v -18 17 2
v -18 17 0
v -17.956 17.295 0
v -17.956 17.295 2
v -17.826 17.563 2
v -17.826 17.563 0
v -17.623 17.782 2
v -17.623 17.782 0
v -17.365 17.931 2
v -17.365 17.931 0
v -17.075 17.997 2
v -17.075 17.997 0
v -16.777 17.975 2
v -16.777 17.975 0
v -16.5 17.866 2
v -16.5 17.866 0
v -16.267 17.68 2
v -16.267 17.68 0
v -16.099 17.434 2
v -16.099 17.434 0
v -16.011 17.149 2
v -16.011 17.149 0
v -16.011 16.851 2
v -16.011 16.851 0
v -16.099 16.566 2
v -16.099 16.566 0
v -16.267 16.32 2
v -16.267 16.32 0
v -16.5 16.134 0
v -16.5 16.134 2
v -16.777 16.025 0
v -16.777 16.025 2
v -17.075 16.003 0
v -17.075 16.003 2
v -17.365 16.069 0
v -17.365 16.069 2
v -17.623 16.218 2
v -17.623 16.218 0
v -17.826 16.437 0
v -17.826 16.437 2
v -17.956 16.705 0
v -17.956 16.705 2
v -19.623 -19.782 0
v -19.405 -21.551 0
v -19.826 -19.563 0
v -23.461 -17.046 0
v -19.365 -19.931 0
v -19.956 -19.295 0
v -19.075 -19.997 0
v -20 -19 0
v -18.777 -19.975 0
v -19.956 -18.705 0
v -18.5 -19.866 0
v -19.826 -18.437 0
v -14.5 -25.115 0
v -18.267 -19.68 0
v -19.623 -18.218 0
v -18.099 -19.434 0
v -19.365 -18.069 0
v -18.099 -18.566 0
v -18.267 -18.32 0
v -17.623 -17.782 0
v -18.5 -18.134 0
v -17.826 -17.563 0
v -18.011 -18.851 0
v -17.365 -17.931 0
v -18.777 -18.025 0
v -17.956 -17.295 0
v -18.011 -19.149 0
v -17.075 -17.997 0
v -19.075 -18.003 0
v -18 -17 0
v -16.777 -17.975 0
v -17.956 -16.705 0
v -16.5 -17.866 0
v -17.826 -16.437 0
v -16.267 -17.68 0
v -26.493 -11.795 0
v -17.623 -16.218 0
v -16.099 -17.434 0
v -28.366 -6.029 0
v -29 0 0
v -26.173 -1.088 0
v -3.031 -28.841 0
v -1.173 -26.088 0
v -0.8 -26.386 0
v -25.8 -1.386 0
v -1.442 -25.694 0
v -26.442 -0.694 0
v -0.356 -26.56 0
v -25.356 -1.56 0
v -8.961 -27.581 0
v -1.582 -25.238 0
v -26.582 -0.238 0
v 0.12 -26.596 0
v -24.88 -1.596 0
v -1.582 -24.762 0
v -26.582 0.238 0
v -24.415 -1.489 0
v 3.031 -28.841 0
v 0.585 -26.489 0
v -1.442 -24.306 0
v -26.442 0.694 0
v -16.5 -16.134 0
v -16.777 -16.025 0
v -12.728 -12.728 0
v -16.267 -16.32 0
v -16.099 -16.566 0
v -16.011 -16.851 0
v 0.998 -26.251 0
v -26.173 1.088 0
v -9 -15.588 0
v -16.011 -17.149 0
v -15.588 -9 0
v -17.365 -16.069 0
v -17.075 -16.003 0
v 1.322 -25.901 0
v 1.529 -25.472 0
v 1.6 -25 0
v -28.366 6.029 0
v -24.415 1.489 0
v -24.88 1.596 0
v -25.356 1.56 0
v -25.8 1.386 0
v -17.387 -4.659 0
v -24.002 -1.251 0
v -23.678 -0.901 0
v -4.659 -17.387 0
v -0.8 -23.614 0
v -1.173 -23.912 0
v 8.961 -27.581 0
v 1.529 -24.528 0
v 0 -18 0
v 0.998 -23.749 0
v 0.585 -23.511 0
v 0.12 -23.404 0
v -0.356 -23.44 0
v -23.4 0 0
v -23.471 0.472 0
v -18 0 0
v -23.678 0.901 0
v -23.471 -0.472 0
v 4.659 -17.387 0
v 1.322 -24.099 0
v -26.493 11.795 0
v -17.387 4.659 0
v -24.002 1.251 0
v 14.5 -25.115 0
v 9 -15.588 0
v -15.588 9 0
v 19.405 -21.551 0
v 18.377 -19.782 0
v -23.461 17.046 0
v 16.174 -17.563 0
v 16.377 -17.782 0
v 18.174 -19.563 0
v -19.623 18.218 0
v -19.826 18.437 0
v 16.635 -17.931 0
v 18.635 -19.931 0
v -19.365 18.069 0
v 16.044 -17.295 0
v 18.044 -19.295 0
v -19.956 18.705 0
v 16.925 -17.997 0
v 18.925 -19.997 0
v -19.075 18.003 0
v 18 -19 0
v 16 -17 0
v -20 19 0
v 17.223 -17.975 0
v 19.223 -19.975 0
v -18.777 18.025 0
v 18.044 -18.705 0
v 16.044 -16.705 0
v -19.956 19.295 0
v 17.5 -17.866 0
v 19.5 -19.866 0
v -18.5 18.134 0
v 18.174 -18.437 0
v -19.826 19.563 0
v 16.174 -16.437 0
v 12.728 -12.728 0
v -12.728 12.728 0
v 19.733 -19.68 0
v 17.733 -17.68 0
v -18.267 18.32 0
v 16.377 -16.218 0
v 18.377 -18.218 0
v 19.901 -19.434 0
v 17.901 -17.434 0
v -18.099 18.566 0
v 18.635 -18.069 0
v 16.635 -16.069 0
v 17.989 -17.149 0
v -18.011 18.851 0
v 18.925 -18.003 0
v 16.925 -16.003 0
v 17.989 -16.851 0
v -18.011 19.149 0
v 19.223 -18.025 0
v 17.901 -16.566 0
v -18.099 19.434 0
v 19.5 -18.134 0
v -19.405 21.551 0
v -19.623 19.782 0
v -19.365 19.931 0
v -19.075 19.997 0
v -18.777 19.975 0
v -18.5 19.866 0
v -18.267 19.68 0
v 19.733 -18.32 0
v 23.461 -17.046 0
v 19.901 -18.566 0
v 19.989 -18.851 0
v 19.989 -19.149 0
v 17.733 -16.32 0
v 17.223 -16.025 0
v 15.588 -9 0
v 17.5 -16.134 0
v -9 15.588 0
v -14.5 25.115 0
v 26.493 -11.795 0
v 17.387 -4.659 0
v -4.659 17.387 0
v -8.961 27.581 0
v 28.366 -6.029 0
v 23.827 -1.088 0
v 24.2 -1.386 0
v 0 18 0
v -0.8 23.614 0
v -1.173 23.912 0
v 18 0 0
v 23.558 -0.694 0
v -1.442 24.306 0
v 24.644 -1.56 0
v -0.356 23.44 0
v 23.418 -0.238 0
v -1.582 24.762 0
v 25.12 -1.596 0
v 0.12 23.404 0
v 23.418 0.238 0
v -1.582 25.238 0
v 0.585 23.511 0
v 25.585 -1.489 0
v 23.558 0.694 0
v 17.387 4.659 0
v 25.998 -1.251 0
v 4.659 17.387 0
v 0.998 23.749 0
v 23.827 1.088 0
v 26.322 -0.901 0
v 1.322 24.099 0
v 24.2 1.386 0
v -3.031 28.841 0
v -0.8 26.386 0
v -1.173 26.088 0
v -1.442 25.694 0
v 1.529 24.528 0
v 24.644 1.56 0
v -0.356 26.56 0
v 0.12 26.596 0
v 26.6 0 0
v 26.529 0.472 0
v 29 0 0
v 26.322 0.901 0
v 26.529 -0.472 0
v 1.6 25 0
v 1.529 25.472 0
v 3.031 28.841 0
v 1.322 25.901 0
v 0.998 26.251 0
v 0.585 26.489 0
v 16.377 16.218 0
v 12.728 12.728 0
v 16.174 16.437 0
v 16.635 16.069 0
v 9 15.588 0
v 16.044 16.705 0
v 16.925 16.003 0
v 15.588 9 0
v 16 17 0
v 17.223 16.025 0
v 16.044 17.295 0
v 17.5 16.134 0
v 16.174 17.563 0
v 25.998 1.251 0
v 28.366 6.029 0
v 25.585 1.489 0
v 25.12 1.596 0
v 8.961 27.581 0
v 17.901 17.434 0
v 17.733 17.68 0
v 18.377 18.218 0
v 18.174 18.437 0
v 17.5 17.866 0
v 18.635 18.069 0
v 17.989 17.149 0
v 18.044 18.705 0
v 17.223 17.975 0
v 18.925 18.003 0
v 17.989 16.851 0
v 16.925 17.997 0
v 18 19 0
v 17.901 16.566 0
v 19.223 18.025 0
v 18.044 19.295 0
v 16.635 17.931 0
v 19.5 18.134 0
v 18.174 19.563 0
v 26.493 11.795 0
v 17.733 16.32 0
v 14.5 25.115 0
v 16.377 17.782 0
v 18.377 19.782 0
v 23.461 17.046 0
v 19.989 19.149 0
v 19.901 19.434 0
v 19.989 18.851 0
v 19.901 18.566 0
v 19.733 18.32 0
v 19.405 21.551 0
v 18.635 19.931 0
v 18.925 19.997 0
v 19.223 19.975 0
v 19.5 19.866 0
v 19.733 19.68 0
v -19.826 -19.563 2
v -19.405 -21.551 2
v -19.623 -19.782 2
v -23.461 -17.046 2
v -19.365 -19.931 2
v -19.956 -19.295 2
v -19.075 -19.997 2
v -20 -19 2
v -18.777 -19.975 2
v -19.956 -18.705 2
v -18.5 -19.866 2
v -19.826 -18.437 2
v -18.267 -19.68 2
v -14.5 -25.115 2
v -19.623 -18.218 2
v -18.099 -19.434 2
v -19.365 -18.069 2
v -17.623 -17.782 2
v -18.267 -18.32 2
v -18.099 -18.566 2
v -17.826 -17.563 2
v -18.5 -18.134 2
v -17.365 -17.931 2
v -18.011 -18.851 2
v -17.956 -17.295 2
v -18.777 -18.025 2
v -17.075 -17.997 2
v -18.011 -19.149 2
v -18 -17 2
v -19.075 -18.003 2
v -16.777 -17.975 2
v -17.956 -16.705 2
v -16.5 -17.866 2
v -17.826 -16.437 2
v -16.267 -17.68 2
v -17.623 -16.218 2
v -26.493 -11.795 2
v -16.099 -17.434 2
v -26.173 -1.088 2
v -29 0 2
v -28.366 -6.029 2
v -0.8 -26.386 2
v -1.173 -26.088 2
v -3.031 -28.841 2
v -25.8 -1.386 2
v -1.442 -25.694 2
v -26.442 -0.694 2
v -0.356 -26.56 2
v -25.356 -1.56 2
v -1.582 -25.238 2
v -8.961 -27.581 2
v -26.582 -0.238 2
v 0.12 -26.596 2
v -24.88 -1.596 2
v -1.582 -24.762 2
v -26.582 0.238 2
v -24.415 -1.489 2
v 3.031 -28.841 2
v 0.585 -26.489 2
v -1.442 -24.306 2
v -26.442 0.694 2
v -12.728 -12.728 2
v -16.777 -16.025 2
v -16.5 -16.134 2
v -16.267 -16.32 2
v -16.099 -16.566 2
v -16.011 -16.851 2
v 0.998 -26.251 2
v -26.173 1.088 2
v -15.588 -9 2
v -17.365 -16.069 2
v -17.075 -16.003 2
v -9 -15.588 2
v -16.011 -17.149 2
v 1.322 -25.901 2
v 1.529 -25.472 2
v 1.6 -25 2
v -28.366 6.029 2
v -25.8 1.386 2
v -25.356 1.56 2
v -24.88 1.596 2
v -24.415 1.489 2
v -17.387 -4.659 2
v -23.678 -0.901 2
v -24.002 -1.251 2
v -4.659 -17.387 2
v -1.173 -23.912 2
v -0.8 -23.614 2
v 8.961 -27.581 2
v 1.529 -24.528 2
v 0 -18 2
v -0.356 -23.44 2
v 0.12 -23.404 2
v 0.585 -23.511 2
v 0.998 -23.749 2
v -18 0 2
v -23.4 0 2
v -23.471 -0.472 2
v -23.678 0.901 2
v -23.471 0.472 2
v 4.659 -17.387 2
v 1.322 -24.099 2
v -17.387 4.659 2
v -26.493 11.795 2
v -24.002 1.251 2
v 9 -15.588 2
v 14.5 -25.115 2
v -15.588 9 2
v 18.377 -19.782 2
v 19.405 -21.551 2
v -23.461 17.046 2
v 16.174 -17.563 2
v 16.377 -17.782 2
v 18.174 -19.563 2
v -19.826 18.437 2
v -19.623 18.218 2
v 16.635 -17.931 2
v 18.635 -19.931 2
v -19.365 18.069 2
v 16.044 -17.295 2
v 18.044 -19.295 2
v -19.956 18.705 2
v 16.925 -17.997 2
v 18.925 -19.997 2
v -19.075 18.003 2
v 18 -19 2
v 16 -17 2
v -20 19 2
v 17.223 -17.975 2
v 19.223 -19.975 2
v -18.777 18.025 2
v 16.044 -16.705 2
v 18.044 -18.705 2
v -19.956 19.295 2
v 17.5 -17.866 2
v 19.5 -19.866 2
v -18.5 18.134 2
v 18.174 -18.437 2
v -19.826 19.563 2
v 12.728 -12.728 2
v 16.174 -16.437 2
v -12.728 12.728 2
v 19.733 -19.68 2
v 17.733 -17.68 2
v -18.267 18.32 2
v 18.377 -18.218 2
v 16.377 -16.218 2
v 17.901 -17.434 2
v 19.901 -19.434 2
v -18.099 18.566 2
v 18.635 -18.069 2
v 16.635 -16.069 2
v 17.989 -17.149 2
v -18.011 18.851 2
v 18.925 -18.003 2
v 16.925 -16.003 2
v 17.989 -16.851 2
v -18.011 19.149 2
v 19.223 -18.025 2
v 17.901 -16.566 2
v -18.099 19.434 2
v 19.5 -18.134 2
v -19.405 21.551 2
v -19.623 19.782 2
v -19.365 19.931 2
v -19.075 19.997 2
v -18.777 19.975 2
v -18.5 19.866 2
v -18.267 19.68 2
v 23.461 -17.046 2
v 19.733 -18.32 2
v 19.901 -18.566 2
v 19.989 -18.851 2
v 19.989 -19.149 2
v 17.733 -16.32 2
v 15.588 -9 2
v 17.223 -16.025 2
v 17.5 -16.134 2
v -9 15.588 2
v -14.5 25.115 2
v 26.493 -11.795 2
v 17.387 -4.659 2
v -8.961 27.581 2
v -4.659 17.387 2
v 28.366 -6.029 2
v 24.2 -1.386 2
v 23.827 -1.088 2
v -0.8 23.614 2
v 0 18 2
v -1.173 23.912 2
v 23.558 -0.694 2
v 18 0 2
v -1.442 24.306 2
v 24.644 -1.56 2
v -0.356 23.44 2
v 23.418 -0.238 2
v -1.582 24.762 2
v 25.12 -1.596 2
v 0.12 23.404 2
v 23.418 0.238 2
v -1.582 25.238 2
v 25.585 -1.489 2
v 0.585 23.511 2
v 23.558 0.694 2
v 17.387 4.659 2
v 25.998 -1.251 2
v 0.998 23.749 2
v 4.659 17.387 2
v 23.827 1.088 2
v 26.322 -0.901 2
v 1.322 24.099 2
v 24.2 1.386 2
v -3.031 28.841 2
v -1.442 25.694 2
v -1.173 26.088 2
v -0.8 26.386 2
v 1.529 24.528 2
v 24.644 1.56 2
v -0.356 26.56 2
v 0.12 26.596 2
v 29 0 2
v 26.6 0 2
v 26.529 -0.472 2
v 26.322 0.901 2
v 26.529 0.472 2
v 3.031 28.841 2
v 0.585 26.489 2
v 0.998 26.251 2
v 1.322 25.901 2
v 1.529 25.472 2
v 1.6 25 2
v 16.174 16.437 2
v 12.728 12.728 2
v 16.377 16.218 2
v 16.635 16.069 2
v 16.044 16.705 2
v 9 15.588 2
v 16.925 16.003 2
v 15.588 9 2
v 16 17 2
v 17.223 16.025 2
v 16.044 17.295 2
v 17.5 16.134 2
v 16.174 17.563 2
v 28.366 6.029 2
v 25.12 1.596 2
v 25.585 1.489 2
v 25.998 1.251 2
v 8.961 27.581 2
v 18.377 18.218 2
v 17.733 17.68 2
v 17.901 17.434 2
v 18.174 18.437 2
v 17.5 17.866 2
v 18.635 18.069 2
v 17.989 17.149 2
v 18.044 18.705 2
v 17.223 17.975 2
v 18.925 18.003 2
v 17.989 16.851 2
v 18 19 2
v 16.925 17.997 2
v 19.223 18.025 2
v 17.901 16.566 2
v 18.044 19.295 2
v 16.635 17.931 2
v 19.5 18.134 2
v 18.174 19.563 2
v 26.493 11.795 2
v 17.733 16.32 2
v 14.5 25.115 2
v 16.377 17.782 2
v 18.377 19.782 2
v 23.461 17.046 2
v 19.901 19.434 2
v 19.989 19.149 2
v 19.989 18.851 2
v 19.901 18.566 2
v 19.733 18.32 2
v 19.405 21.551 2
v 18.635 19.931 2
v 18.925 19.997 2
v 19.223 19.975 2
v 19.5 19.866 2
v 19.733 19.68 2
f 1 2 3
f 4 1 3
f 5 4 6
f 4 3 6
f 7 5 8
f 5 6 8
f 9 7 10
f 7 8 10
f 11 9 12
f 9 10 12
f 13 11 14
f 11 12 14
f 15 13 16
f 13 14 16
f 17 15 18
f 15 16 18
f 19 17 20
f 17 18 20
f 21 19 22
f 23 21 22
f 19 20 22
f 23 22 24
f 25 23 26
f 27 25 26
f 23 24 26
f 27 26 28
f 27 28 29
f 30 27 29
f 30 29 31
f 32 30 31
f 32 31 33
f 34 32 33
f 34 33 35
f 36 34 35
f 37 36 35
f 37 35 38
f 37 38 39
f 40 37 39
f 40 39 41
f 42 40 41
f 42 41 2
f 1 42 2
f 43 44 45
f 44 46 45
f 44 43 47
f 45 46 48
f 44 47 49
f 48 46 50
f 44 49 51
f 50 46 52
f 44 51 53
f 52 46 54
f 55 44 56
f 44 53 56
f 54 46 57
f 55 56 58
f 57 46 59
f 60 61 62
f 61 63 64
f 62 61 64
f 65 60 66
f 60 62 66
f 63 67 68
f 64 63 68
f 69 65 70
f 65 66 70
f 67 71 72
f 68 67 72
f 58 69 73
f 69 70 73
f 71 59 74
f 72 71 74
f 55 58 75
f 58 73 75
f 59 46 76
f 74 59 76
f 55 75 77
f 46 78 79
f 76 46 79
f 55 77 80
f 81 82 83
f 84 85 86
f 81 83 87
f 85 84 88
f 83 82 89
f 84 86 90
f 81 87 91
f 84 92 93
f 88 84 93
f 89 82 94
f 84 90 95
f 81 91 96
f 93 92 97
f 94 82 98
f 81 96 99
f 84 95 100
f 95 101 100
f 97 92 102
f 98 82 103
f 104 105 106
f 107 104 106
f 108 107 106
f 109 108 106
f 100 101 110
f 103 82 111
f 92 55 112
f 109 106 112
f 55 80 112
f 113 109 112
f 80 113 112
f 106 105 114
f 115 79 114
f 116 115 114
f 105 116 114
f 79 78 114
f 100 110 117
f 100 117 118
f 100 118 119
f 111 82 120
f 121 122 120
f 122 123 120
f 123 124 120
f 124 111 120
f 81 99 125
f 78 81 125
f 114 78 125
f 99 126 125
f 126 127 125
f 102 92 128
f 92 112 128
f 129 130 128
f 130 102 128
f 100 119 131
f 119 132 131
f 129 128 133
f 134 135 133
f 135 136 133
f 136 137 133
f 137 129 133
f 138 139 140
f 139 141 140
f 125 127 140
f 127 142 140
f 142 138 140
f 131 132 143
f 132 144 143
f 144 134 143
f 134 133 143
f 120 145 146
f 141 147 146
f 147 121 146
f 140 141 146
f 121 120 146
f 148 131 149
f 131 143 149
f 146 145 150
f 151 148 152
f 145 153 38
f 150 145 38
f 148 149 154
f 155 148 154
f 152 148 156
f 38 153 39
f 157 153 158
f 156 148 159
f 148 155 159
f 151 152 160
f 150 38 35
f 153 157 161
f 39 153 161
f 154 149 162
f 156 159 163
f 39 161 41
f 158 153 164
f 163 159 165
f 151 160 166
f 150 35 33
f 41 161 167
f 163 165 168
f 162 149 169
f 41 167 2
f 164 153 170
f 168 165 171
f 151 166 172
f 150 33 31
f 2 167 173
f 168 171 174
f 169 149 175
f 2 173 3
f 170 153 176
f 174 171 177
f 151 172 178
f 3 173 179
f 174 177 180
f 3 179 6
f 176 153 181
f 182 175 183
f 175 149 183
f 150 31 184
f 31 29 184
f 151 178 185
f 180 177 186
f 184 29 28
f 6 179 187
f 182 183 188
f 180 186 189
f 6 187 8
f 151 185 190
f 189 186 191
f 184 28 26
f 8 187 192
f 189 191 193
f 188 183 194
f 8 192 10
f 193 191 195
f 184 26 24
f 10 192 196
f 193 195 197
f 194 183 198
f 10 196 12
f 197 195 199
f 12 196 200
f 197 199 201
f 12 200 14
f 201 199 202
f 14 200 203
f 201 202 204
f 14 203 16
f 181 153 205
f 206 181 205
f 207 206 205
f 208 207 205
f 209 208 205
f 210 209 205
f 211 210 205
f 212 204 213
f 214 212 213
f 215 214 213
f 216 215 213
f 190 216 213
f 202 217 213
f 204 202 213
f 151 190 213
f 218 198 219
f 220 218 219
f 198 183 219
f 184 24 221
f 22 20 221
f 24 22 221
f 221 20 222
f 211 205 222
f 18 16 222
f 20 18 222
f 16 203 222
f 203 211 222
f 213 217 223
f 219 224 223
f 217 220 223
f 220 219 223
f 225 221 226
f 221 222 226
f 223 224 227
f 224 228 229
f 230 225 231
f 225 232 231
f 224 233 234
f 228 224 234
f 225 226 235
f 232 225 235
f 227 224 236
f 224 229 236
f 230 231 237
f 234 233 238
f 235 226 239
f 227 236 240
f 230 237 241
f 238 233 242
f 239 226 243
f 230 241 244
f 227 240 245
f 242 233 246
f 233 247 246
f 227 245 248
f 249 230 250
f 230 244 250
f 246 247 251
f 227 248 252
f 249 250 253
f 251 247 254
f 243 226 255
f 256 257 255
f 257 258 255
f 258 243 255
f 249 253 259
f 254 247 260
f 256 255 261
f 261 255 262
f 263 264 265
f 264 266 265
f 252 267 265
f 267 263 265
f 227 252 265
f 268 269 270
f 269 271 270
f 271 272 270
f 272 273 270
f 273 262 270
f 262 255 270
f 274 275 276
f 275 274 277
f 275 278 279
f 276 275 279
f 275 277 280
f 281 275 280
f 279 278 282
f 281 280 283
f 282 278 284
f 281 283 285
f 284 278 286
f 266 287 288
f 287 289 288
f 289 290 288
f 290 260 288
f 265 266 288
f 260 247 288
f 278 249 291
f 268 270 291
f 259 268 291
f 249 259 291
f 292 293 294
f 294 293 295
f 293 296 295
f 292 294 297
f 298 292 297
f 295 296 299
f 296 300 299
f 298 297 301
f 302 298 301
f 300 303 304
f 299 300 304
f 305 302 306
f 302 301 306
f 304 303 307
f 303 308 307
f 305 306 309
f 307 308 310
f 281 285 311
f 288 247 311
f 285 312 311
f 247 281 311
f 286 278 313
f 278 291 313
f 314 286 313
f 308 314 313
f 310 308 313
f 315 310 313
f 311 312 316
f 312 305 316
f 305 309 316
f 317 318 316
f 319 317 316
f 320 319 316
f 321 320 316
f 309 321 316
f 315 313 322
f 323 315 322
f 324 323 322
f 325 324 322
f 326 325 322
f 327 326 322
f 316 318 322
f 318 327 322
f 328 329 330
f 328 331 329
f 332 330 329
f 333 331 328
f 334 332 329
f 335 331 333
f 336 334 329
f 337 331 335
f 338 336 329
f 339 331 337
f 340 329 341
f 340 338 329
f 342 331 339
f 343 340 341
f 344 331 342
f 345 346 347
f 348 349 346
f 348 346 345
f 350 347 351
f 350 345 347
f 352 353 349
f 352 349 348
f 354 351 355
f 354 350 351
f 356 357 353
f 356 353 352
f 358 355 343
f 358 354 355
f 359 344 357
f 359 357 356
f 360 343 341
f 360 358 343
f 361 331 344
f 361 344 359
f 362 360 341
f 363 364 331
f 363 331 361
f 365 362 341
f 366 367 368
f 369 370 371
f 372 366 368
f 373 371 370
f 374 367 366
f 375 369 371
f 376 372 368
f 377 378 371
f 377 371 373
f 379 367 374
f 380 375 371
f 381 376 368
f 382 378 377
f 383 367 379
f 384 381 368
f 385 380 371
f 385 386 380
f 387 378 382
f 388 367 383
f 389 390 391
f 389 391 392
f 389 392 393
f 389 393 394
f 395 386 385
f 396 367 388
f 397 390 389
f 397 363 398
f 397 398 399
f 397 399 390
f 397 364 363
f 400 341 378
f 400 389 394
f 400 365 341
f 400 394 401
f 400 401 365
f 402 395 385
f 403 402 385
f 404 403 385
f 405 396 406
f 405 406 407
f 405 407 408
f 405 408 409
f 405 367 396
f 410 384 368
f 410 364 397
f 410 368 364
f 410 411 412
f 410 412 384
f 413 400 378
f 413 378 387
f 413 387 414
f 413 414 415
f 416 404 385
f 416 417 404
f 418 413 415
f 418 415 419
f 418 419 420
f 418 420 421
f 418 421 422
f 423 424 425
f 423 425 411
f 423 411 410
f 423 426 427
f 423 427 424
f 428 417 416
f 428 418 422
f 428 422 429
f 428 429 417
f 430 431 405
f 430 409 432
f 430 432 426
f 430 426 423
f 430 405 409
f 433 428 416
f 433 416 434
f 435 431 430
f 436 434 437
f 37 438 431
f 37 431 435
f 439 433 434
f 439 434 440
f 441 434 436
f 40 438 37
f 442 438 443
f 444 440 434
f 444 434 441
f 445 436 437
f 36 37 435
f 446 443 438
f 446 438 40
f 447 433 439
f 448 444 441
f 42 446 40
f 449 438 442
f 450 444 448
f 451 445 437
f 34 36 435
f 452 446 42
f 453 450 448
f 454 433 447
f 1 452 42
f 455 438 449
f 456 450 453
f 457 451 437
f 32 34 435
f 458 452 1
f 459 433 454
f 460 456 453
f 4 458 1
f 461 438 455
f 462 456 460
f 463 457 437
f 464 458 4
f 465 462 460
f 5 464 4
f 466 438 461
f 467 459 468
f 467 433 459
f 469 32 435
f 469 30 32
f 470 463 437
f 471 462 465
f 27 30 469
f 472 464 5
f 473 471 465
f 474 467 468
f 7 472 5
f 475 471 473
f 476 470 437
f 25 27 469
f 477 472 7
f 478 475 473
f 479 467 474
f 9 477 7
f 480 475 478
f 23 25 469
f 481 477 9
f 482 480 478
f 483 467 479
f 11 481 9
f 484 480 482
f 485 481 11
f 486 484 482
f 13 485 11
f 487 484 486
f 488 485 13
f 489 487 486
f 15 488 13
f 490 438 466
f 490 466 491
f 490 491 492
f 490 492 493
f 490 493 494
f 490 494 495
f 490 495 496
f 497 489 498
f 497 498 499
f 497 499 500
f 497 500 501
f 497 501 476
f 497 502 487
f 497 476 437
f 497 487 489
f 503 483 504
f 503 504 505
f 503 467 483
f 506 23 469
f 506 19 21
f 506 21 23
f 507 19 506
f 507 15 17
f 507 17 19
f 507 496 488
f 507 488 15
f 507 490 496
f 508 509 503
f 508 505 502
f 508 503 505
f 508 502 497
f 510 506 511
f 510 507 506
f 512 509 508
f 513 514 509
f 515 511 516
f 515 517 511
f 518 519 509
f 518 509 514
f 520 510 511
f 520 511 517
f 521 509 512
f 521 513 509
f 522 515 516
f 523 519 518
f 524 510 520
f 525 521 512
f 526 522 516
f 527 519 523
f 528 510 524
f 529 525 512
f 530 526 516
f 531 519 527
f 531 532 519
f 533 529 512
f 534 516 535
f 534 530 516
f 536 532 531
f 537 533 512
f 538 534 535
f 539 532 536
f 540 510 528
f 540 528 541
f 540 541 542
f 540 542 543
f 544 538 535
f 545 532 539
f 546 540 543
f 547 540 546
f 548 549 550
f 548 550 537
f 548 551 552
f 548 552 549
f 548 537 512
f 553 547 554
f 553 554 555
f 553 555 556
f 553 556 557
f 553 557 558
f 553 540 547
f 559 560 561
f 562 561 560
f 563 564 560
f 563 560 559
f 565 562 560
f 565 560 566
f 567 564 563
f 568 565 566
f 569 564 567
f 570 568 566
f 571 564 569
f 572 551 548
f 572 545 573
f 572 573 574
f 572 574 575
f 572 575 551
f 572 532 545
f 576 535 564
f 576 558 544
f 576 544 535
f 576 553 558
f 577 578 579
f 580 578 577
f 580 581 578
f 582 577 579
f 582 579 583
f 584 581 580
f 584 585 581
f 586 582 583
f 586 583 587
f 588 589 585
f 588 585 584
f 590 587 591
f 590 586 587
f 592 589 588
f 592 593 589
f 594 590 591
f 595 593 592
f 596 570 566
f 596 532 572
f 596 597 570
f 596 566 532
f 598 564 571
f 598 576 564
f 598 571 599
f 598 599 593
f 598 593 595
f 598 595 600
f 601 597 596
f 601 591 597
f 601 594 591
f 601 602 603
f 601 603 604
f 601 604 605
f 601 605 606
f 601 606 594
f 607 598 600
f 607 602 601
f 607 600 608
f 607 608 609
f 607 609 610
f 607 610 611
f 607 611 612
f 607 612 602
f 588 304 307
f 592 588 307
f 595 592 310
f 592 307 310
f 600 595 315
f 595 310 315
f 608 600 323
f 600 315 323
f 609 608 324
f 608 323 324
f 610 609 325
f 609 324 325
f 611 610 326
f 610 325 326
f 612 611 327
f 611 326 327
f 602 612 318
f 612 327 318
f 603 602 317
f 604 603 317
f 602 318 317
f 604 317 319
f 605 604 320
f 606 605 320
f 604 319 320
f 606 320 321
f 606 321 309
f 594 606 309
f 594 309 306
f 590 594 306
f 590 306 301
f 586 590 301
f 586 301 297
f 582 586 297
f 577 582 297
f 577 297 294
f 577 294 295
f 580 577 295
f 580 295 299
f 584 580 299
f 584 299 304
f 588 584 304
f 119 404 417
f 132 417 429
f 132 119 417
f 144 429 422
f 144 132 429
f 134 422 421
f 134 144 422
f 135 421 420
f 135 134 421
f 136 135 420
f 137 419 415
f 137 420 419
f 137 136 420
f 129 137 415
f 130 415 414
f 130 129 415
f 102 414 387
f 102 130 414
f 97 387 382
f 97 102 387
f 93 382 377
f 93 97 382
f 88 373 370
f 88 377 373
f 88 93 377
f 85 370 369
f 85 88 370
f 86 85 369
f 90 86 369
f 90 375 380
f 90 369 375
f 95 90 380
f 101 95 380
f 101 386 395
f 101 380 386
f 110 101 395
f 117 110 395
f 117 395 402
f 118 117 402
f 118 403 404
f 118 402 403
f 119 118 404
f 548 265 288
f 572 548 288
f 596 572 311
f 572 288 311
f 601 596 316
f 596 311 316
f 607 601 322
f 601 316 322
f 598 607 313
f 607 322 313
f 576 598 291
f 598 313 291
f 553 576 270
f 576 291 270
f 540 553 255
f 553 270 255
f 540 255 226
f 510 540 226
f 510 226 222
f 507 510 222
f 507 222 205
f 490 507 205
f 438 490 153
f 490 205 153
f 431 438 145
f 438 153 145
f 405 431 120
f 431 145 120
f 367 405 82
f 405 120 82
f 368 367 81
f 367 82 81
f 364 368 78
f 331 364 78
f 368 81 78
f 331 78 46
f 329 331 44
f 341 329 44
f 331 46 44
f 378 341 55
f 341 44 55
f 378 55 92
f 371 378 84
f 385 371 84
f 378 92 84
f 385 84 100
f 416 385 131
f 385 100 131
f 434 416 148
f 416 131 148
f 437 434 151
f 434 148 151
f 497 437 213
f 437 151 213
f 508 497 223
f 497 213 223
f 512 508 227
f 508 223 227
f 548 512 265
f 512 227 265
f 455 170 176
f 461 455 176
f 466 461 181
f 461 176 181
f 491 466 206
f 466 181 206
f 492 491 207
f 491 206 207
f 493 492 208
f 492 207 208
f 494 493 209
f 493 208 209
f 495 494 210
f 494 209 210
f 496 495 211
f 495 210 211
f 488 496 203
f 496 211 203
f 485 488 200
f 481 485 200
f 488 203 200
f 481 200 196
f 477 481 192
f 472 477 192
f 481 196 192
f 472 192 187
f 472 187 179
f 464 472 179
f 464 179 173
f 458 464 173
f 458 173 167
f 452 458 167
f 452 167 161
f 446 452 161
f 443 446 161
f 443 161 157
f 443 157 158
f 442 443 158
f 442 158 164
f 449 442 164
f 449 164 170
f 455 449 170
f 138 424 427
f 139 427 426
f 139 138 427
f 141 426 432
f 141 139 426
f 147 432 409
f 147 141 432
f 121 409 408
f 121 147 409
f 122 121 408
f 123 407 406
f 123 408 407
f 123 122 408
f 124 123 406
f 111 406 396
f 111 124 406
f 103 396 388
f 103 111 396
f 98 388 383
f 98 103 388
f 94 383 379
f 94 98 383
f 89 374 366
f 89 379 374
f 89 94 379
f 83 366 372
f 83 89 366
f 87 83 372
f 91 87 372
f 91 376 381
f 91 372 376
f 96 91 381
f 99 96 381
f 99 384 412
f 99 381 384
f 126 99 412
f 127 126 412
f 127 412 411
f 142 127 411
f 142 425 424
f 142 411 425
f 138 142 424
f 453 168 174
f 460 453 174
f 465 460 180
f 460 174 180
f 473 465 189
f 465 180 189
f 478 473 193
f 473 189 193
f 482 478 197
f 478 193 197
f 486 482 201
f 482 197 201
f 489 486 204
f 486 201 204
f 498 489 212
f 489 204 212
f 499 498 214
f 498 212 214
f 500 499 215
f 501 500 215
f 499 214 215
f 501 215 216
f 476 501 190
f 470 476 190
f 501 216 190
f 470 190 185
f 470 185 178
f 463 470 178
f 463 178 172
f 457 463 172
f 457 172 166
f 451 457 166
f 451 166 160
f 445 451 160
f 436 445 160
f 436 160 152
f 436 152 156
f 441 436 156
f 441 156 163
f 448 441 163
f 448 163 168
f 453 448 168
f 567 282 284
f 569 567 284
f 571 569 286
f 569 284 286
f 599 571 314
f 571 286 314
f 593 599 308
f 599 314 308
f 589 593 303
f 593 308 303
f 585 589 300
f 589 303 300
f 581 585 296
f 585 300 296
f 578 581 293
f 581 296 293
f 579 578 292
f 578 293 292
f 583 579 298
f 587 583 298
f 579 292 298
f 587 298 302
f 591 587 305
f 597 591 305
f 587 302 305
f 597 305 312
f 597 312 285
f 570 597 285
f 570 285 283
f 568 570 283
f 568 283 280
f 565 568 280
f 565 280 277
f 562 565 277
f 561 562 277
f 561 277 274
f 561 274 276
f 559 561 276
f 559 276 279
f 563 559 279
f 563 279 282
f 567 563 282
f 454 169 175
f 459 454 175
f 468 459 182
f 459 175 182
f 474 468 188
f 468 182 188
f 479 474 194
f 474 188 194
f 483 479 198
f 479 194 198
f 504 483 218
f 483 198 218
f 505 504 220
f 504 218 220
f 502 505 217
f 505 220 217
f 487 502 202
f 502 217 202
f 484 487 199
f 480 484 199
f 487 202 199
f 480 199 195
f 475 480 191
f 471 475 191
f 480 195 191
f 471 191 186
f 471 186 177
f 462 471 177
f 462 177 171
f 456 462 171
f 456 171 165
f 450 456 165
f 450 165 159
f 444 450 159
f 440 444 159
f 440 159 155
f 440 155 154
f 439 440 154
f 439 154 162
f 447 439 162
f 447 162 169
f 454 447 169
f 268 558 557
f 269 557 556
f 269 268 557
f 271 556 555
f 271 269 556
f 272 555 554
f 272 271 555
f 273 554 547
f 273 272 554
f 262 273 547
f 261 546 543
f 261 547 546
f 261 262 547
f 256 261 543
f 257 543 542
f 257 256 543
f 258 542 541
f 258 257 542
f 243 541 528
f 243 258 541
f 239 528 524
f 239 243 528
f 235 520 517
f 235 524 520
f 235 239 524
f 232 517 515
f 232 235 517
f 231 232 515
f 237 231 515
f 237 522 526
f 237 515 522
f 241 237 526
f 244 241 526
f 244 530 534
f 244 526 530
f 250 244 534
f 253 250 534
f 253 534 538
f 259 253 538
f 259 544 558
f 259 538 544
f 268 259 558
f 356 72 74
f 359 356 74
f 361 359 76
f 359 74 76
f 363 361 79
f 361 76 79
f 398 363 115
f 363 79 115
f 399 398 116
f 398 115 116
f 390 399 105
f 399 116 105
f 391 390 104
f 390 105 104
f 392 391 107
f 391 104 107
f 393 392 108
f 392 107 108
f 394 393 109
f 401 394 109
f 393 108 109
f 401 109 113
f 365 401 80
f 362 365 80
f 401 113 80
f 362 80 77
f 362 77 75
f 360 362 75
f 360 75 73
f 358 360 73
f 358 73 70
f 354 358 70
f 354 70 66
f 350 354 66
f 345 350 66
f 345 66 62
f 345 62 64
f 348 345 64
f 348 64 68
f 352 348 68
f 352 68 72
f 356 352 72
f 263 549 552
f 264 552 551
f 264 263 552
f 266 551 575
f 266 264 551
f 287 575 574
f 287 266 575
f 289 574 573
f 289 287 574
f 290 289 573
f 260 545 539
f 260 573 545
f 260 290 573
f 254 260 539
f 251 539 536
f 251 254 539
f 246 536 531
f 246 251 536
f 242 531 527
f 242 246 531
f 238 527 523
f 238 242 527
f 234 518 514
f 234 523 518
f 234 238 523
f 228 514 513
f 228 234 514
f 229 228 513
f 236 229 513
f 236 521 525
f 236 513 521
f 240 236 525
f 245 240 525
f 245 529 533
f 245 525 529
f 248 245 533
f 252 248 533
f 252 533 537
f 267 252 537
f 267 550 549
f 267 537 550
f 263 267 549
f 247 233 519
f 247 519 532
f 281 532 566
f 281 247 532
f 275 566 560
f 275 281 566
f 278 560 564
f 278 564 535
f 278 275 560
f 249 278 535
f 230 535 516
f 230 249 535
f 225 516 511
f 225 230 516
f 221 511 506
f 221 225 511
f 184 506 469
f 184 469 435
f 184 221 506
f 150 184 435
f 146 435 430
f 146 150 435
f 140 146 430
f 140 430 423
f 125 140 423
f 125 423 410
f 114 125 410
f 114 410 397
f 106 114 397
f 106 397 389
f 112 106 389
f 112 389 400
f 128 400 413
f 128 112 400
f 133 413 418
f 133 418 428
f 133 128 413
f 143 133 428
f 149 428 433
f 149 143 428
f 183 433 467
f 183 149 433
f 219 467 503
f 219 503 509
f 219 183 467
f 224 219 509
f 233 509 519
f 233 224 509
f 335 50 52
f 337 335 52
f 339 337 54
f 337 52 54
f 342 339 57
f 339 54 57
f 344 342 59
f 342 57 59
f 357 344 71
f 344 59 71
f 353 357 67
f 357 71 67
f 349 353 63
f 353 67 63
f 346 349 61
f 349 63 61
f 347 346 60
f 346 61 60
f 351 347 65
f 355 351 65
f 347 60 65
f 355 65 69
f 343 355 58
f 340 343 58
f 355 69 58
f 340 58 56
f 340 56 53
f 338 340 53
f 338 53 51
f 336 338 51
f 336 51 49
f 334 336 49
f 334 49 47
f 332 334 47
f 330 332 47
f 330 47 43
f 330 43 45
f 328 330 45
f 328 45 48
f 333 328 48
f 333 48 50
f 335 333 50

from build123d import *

# Parameters (mm, degrees)
SKETCH1_R             = 18
BOSS_EXTRUDE1_DEPTH   = 2
F_2_0MM_DOWEL_HOLE1_D = 2
SKETCH5_R             = 1.6
CUT_EXTRUDE4_DEPTH    = 42.060930335


with BuildPart() as part:
    # Sketch1 → Boss-Extrude1 (new body)
    with BuildSketch(Plane.XY):
        with BuildLine():
            ThreePointArc((-29, 0), (0, -29), (29, 0))
            ThreePointArc((29, 0), (0, 29), (-29, 0))
        make_face()
        Circle(SKETCH1_R, mode=Mode.SUBTRACT)
    extrude(amount=BOSS_EXTRUDE1_DEPTH)

    # Ø2.0mm Dowel Hole1 (through all)
    with Locations(Plane(origin=(-19, 19, 2), x_dir=(1, 0, 0), z_dir=(0, 0, 1))):
        with Locations((0, 0), (2, -2), (36, -2), (38, 0), (36, -36), (38, -38), (0, -38), (2, -36)):
            Hole(F_2_0MM_DOWEL_HOLE1_D / 2)

    # Sketch5 → Cut-Extrude4 (cut, through all)
    with BuildSketch(Plane.XY):
        with Locations((0, 25)):
            Circle(SKETCH5_R)
        with Locations((-25, 0)):
            Circle(SKETCH5_R)
        with Locations((25, 0)):
            Circle(SKETCH5_R)
        with Locations((0, -25)):
            Circle(SKETCH5_R)
    extrude(amount=CUT_EXTRUDE4_DEPTH, mode=Mode.SUBTRACT)


solid = part.part
